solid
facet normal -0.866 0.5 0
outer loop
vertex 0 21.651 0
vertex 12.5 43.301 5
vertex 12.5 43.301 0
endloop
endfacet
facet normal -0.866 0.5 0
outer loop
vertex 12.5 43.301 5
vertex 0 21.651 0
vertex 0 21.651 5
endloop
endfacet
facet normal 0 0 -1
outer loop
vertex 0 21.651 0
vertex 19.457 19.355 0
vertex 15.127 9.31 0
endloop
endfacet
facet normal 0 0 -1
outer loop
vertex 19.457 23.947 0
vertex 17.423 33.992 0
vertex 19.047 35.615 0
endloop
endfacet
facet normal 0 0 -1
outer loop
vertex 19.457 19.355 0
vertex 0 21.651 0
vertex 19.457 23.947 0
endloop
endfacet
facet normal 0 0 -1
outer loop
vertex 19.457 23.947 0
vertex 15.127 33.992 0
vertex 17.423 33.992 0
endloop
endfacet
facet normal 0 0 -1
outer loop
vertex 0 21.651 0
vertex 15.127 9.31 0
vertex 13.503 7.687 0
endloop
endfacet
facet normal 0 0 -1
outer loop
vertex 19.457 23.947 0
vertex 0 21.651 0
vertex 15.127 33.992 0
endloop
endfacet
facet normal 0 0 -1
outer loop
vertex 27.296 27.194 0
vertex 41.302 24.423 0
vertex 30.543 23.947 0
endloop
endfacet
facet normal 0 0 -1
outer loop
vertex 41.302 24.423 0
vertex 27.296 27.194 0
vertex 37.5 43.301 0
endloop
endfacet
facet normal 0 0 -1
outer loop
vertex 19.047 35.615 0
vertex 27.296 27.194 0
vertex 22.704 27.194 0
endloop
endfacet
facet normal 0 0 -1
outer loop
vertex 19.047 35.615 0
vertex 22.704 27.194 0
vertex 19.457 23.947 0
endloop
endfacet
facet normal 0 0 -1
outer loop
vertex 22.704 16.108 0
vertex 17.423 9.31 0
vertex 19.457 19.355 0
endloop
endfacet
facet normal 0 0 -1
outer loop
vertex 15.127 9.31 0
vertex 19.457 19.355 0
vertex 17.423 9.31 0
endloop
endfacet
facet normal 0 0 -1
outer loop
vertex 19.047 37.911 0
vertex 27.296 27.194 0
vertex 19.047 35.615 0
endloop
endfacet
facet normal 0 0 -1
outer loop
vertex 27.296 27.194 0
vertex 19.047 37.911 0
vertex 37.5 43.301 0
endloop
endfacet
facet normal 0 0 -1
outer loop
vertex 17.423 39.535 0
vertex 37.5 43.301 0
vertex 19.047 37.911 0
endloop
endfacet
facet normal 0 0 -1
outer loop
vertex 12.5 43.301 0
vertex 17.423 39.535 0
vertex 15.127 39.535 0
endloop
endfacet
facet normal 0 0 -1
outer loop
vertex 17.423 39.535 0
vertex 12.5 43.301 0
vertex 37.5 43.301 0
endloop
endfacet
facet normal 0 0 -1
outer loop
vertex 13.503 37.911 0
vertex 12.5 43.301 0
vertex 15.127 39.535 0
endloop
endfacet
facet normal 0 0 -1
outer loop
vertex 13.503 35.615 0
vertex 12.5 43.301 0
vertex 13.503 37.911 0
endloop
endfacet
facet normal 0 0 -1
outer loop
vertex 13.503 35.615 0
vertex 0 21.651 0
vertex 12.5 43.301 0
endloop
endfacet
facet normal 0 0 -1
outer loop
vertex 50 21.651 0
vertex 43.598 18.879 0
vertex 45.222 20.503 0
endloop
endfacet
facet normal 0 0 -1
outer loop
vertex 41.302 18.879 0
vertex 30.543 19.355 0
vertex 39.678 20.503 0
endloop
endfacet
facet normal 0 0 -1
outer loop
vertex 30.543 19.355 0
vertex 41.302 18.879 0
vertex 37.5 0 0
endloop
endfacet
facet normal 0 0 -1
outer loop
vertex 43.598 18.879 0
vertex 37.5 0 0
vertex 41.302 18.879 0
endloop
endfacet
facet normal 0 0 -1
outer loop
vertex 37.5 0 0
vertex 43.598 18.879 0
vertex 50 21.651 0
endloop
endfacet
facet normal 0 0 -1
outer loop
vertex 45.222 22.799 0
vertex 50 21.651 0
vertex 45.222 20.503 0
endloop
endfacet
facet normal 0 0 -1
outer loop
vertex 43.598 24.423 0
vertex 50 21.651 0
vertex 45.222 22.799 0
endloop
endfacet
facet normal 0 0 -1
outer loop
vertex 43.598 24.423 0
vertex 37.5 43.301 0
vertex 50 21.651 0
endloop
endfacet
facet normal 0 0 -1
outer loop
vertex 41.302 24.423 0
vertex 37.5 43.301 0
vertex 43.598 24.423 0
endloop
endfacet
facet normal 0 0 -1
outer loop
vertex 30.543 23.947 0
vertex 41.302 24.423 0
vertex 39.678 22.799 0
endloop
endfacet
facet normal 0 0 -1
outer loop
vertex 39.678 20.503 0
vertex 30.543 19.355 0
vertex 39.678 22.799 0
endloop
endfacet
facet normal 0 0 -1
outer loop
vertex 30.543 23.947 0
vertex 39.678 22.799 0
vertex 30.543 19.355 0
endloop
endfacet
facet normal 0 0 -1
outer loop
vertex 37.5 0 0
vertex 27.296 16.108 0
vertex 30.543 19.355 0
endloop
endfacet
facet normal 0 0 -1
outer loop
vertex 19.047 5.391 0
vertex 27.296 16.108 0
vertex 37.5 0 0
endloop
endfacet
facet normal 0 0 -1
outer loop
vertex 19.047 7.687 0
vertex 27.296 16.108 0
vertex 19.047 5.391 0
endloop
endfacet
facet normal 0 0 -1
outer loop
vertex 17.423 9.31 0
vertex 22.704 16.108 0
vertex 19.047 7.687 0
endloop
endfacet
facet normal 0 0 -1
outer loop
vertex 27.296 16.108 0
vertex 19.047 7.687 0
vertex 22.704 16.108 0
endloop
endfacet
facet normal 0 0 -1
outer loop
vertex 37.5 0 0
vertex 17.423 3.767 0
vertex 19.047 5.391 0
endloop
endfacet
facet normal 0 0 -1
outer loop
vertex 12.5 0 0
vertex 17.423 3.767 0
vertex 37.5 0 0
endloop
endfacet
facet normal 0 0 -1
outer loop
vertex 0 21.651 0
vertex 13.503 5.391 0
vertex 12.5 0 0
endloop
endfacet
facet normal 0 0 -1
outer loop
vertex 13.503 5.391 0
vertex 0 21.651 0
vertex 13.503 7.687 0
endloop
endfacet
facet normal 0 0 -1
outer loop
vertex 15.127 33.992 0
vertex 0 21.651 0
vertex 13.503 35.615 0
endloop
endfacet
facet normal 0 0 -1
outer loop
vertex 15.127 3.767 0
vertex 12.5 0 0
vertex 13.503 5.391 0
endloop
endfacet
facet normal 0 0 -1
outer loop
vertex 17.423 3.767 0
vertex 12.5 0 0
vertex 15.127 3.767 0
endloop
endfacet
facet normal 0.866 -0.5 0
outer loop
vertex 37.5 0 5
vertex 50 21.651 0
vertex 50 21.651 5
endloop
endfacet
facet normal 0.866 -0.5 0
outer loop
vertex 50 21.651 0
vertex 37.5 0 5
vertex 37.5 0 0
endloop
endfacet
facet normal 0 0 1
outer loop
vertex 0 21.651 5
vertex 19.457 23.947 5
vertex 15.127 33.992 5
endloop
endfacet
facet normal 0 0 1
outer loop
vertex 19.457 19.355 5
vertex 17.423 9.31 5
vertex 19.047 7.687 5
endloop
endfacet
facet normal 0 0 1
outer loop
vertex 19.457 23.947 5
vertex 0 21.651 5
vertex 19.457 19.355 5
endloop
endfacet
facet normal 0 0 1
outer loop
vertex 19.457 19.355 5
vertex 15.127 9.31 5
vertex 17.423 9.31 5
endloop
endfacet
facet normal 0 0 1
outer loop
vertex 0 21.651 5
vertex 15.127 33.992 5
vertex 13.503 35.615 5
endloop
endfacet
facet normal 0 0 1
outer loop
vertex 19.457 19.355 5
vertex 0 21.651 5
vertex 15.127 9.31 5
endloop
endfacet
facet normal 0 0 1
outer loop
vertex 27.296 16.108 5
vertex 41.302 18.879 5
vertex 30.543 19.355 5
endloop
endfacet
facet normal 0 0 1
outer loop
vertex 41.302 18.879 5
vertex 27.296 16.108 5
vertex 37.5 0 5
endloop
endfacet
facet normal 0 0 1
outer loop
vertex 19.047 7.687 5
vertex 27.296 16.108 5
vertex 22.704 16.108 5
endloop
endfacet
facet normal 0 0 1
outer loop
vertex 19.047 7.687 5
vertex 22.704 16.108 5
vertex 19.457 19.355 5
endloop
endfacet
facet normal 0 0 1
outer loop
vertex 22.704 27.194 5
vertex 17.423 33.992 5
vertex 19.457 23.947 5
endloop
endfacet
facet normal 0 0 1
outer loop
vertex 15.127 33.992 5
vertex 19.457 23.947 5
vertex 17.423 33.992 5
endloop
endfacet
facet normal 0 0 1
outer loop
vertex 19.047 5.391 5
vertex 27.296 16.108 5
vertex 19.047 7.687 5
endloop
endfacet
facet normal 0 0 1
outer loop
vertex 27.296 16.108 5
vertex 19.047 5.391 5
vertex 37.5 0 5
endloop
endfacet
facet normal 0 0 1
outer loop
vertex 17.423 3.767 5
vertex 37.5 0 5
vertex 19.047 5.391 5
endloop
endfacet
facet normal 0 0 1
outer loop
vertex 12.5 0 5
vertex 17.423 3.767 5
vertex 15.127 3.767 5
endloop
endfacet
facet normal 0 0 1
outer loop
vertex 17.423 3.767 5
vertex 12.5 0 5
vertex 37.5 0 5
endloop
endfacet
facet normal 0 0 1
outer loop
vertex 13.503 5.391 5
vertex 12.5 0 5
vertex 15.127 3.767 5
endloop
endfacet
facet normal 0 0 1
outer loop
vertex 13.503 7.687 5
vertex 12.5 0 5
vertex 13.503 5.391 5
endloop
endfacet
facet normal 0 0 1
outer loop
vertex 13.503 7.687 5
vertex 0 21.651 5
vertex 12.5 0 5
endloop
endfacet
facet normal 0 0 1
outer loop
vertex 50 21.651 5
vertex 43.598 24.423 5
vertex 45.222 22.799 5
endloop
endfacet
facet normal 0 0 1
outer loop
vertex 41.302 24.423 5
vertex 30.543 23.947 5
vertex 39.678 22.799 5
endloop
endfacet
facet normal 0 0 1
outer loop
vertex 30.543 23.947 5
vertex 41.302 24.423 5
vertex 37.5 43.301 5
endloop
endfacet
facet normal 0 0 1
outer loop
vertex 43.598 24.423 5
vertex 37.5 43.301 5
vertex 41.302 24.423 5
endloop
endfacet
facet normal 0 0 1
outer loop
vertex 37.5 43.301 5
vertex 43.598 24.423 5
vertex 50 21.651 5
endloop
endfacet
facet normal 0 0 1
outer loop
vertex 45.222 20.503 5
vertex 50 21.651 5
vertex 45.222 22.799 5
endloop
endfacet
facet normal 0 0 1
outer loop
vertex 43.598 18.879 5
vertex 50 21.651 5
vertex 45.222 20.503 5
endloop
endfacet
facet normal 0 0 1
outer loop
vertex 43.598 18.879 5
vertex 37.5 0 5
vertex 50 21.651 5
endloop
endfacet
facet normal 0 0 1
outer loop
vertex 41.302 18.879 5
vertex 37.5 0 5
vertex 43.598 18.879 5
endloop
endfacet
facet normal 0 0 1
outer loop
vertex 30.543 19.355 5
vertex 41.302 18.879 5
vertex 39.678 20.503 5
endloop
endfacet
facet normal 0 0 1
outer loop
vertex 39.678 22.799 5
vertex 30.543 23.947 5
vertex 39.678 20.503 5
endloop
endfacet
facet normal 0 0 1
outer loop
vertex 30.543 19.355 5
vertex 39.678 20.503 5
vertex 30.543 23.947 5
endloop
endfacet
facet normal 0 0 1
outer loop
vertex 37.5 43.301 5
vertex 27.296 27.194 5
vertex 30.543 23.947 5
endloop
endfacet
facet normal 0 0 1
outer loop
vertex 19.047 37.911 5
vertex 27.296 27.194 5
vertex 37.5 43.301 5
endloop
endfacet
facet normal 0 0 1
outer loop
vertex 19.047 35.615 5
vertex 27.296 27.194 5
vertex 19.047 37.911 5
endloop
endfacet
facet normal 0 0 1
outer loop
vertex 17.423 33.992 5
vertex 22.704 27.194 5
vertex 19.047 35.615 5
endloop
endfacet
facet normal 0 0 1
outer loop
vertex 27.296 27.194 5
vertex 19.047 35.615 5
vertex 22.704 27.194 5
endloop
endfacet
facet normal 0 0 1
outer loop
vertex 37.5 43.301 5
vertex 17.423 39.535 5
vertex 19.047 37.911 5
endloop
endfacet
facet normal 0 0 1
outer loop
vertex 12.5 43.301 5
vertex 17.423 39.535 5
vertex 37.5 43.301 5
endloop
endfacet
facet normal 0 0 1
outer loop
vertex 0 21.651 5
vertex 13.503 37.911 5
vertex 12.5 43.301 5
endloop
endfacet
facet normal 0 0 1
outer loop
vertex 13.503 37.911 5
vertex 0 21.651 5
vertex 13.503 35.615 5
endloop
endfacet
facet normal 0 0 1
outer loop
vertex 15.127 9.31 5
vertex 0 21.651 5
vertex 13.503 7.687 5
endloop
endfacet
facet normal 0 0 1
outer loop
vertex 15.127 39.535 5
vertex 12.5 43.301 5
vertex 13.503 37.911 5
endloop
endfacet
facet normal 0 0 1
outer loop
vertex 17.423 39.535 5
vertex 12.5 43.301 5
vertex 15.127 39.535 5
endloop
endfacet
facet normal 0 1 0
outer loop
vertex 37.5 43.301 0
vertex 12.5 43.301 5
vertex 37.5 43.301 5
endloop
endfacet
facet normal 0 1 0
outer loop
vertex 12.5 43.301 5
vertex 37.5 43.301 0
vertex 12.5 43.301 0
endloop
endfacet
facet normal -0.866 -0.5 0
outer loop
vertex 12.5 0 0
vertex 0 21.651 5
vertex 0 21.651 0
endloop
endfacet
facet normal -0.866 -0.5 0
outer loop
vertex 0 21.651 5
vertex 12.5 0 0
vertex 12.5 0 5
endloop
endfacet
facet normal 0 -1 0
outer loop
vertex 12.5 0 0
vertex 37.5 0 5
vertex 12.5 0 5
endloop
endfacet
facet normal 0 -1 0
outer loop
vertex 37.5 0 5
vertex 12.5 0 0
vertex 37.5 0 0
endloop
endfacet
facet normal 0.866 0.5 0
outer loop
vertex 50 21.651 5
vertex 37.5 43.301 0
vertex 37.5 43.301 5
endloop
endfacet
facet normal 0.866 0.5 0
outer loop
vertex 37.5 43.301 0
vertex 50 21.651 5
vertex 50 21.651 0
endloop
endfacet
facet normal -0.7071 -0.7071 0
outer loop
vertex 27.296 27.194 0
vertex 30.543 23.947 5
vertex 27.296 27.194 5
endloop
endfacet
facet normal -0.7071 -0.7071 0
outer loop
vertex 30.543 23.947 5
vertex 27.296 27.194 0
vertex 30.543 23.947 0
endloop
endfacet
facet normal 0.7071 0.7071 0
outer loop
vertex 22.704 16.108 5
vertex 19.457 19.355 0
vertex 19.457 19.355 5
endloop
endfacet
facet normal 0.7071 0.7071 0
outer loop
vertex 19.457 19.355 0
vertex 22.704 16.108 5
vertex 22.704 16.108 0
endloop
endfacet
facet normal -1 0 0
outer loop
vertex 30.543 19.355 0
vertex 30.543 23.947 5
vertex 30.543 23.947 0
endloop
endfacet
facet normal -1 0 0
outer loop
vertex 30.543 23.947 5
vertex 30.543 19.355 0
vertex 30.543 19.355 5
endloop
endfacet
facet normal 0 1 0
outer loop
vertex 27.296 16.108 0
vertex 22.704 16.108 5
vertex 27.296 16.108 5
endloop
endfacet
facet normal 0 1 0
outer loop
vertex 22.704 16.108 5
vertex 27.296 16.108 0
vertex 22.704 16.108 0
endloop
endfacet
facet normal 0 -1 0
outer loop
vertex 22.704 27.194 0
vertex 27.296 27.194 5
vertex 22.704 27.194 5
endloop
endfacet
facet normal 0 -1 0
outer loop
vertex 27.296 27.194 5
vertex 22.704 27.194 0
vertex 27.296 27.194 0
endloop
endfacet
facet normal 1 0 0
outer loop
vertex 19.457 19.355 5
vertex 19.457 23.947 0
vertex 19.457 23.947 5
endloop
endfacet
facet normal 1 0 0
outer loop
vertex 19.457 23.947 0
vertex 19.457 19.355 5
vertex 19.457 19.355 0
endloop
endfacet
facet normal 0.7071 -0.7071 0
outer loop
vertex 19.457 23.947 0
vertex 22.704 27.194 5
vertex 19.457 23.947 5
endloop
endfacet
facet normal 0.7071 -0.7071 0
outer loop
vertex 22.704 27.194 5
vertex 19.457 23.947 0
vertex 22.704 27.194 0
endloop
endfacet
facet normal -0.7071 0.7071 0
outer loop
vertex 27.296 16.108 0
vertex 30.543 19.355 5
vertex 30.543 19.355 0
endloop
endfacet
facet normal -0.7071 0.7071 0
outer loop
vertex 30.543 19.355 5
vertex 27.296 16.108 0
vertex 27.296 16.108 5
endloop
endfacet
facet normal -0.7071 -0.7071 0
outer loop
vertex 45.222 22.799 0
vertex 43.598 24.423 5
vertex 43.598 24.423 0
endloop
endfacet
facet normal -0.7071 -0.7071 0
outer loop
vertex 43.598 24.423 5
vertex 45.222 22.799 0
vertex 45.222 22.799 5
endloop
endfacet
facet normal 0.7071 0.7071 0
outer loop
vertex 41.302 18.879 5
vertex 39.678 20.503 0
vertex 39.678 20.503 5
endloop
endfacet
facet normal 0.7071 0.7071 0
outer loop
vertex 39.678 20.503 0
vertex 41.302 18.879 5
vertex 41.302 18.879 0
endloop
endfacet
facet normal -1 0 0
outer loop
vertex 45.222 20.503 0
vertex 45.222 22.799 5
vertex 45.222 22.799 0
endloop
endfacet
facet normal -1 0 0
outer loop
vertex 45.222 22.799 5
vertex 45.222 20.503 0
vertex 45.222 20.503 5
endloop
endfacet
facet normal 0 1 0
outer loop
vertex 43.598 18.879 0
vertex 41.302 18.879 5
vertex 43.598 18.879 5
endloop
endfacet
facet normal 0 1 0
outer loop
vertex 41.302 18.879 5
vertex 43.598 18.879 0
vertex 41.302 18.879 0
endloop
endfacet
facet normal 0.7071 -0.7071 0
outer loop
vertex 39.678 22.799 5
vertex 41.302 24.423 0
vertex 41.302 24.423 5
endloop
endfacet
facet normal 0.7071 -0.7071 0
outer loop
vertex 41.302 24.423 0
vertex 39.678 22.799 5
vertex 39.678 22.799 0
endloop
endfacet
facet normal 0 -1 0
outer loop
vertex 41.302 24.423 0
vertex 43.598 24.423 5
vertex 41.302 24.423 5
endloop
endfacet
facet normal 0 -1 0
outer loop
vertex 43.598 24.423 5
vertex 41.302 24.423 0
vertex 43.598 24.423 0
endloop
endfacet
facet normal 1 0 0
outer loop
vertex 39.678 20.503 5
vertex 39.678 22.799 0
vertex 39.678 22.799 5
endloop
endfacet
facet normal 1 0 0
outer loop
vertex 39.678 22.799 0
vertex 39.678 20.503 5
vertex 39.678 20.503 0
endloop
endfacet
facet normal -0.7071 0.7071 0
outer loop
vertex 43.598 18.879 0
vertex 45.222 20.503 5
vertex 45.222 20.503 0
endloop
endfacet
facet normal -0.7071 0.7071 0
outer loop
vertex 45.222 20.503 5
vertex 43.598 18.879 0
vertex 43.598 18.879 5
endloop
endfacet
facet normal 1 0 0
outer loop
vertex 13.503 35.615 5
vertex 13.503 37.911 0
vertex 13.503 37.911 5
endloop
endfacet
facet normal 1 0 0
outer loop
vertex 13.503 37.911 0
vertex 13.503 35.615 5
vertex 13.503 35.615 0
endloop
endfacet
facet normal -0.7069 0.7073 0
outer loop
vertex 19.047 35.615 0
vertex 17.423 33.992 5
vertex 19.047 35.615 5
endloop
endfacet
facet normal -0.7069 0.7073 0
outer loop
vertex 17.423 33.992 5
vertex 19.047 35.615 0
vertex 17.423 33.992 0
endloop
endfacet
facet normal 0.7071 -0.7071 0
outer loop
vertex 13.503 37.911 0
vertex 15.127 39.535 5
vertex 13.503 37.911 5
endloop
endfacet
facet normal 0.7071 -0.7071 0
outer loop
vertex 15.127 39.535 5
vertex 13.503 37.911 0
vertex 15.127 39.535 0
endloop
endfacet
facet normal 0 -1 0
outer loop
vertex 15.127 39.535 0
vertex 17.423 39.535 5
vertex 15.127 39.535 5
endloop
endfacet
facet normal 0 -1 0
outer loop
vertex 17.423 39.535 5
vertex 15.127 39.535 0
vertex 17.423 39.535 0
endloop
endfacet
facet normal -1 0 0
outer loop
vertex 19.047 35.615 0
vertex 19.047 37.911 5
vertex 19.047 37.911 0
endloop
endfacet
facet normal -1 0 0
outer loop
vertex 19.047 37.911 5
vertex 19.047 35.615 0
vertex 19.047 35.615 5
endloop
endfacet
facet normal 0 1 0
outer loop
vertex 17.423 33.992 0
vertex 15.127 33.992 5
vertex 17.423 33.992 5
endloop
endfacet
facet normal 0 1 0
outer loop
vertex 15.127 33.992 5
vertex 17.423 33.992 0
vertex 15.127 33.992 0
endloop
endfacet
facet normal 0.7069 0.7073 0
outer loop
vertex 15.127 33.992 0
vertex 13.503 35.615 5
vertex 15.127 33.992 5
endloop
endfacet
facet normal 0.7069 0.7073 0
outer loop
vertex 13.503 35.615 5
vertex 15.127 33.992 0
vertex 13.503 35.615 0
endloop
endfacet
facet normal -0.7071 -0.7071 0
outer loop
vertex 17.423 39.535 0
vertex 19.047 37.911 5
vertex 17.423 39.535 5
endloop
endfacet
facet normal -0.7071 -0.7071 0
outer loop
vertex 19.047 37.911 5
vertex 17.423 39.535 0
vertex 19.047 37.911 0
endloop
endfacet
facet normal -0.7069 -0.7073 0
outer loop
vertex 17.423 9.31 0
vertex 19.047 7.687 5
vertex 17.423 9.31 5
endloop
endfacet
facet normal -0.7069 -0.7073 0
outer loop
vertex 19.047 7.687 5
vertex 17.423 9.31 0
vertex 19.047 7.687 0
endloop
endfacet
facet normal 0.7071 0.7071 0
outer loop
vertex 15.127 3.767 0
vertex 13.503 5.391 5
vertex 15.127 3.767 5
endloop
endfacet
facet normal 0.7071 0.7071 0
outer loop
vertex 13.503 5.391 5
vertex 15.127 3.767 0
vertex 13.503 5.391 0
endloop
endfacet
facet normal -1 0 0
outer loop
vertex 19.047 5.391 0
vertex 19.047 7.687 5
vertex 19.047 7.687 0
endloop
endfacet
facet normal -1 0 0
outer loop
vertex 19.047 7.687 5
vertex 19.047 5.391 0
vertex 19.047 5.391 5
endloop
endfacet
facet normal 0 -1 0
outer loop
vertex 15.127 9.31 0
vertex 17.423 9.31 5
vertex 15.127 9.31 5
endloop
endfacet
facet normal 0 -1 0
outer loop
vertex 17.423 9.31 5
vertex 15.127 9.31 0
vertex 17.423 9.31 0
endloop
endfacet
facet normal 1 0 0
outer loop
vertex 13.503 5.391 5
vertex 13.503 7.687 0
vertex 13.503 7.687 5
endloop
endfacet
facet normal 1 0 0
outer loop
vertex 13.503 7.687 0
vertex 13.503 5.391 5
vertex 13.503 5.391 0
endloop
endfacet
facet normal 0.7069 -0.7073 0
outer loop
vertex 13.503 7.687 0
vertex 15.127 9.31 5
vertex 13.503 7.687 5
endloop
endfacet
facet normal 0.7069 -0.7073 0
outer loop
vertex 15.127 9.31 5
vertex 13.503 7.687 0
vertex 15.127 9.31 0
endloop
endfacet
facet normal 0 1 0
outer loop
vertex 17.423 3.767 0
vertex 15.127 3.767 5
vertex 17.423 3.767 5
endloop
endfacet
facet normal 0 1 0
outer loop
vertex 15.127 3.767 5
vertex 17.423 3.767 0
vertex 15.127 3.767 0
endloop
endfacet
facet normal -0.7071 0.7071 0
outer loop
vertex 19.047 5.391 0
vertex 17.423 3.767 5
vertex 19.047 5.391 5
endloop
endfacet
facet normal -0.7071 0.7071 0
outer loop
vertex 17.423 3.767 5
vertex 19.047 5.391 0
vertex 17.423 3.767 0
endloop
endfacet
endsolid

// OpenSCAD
$fn = 32;

// ----------------------------------------------------------------------
// Polygon plate: 6-gon R25, 3 bolt windows
// ----------------------------------------------------------------------

// --- parameters (mm) ---
sides = 6;                // number of polygon sides
plate_r = 25;             // circumscribed radius of the polygon
bore_r = 6;               // centre bore radius
bolts = 3;                // number of bolt windows
ring_r = 17.45;           // bolt-circle radius
bolt_r = 3;               // bolt window radius
plate_t = 5;              // plate thickness, Z (extrusion height)
fit_tol = 0.02;           // declared fit tolerance (prompt contract)
free_tol = 0.2;           // declared free tolerance (prompt contract)

plate_d = 2 * plate_r;  // circumscribed diameter
bore_d = 2 * bore_r;  // centre bore diameter
bolt_d = 2 * bolt_r;  // bolt window diameter
ring_d = 2 * ring_r;  // bolt-circle diameter

profile = [[50, 21.651], [37.5, 43.301], [12.5, 43.301], [0, 21.651], [12.5, 0], [37.5, 0]];  // primary outline, 6 points, counter clockwise
void_1 = [[30.543, 23.947], [27.296, 27.194], [22.704, 27.194], [19.457, 23.947], [19.457, 19.355], [22.704, 16.108], [27.296, 16.108], [30.543, 19.355]];  // centre bore, 8 points
void_2 = [[45.222, 22.799], [43.598, 24.423], [41.302, 24.423], [39.678, 22.799], [39.678, 20.503], [41.302, 18.879], [43.598, 18.879], [45.222, 20.503]];  // bolt window 1, 8 points
void_3 = [[19.047, 37.911], [17.423, 39.535], [15.127, 39.535], [13.503, 37.911], [13.503, 35.615], [15.127, 33.992], [17.423, 33.992], [19.047, 35.615]];  // bolt window 2, 8 points
void_4 = [[19.047, 7.687], [17.423, 9.31], [15.127, 9.31], [13.503, 7.687], [13.503, 5.391], [15.127, 3.767], [17.423, 3.767], [19.047, 5.391]];  // bolt window 3, 8 points

// --- the one profile operation ---
difference() {
  linear_extrude(height = plate_t) polygon(points = profile);
  translate([0, 0, -1])
    linear_extrude(height = plate_t + 2) polygon(points = void_1);
  translate([0, 0, -1])
    linear_extrude(height = plate_t + 2) polygon(points = void_2);
  translate([0, 0, -1])
    linear_extrude(height = plate_t + 2) polygon(points = void_3);
  translate([0, 0, -1])
    linear_extrude(height = plate_t + 2) polygon(points = void_4);
}
